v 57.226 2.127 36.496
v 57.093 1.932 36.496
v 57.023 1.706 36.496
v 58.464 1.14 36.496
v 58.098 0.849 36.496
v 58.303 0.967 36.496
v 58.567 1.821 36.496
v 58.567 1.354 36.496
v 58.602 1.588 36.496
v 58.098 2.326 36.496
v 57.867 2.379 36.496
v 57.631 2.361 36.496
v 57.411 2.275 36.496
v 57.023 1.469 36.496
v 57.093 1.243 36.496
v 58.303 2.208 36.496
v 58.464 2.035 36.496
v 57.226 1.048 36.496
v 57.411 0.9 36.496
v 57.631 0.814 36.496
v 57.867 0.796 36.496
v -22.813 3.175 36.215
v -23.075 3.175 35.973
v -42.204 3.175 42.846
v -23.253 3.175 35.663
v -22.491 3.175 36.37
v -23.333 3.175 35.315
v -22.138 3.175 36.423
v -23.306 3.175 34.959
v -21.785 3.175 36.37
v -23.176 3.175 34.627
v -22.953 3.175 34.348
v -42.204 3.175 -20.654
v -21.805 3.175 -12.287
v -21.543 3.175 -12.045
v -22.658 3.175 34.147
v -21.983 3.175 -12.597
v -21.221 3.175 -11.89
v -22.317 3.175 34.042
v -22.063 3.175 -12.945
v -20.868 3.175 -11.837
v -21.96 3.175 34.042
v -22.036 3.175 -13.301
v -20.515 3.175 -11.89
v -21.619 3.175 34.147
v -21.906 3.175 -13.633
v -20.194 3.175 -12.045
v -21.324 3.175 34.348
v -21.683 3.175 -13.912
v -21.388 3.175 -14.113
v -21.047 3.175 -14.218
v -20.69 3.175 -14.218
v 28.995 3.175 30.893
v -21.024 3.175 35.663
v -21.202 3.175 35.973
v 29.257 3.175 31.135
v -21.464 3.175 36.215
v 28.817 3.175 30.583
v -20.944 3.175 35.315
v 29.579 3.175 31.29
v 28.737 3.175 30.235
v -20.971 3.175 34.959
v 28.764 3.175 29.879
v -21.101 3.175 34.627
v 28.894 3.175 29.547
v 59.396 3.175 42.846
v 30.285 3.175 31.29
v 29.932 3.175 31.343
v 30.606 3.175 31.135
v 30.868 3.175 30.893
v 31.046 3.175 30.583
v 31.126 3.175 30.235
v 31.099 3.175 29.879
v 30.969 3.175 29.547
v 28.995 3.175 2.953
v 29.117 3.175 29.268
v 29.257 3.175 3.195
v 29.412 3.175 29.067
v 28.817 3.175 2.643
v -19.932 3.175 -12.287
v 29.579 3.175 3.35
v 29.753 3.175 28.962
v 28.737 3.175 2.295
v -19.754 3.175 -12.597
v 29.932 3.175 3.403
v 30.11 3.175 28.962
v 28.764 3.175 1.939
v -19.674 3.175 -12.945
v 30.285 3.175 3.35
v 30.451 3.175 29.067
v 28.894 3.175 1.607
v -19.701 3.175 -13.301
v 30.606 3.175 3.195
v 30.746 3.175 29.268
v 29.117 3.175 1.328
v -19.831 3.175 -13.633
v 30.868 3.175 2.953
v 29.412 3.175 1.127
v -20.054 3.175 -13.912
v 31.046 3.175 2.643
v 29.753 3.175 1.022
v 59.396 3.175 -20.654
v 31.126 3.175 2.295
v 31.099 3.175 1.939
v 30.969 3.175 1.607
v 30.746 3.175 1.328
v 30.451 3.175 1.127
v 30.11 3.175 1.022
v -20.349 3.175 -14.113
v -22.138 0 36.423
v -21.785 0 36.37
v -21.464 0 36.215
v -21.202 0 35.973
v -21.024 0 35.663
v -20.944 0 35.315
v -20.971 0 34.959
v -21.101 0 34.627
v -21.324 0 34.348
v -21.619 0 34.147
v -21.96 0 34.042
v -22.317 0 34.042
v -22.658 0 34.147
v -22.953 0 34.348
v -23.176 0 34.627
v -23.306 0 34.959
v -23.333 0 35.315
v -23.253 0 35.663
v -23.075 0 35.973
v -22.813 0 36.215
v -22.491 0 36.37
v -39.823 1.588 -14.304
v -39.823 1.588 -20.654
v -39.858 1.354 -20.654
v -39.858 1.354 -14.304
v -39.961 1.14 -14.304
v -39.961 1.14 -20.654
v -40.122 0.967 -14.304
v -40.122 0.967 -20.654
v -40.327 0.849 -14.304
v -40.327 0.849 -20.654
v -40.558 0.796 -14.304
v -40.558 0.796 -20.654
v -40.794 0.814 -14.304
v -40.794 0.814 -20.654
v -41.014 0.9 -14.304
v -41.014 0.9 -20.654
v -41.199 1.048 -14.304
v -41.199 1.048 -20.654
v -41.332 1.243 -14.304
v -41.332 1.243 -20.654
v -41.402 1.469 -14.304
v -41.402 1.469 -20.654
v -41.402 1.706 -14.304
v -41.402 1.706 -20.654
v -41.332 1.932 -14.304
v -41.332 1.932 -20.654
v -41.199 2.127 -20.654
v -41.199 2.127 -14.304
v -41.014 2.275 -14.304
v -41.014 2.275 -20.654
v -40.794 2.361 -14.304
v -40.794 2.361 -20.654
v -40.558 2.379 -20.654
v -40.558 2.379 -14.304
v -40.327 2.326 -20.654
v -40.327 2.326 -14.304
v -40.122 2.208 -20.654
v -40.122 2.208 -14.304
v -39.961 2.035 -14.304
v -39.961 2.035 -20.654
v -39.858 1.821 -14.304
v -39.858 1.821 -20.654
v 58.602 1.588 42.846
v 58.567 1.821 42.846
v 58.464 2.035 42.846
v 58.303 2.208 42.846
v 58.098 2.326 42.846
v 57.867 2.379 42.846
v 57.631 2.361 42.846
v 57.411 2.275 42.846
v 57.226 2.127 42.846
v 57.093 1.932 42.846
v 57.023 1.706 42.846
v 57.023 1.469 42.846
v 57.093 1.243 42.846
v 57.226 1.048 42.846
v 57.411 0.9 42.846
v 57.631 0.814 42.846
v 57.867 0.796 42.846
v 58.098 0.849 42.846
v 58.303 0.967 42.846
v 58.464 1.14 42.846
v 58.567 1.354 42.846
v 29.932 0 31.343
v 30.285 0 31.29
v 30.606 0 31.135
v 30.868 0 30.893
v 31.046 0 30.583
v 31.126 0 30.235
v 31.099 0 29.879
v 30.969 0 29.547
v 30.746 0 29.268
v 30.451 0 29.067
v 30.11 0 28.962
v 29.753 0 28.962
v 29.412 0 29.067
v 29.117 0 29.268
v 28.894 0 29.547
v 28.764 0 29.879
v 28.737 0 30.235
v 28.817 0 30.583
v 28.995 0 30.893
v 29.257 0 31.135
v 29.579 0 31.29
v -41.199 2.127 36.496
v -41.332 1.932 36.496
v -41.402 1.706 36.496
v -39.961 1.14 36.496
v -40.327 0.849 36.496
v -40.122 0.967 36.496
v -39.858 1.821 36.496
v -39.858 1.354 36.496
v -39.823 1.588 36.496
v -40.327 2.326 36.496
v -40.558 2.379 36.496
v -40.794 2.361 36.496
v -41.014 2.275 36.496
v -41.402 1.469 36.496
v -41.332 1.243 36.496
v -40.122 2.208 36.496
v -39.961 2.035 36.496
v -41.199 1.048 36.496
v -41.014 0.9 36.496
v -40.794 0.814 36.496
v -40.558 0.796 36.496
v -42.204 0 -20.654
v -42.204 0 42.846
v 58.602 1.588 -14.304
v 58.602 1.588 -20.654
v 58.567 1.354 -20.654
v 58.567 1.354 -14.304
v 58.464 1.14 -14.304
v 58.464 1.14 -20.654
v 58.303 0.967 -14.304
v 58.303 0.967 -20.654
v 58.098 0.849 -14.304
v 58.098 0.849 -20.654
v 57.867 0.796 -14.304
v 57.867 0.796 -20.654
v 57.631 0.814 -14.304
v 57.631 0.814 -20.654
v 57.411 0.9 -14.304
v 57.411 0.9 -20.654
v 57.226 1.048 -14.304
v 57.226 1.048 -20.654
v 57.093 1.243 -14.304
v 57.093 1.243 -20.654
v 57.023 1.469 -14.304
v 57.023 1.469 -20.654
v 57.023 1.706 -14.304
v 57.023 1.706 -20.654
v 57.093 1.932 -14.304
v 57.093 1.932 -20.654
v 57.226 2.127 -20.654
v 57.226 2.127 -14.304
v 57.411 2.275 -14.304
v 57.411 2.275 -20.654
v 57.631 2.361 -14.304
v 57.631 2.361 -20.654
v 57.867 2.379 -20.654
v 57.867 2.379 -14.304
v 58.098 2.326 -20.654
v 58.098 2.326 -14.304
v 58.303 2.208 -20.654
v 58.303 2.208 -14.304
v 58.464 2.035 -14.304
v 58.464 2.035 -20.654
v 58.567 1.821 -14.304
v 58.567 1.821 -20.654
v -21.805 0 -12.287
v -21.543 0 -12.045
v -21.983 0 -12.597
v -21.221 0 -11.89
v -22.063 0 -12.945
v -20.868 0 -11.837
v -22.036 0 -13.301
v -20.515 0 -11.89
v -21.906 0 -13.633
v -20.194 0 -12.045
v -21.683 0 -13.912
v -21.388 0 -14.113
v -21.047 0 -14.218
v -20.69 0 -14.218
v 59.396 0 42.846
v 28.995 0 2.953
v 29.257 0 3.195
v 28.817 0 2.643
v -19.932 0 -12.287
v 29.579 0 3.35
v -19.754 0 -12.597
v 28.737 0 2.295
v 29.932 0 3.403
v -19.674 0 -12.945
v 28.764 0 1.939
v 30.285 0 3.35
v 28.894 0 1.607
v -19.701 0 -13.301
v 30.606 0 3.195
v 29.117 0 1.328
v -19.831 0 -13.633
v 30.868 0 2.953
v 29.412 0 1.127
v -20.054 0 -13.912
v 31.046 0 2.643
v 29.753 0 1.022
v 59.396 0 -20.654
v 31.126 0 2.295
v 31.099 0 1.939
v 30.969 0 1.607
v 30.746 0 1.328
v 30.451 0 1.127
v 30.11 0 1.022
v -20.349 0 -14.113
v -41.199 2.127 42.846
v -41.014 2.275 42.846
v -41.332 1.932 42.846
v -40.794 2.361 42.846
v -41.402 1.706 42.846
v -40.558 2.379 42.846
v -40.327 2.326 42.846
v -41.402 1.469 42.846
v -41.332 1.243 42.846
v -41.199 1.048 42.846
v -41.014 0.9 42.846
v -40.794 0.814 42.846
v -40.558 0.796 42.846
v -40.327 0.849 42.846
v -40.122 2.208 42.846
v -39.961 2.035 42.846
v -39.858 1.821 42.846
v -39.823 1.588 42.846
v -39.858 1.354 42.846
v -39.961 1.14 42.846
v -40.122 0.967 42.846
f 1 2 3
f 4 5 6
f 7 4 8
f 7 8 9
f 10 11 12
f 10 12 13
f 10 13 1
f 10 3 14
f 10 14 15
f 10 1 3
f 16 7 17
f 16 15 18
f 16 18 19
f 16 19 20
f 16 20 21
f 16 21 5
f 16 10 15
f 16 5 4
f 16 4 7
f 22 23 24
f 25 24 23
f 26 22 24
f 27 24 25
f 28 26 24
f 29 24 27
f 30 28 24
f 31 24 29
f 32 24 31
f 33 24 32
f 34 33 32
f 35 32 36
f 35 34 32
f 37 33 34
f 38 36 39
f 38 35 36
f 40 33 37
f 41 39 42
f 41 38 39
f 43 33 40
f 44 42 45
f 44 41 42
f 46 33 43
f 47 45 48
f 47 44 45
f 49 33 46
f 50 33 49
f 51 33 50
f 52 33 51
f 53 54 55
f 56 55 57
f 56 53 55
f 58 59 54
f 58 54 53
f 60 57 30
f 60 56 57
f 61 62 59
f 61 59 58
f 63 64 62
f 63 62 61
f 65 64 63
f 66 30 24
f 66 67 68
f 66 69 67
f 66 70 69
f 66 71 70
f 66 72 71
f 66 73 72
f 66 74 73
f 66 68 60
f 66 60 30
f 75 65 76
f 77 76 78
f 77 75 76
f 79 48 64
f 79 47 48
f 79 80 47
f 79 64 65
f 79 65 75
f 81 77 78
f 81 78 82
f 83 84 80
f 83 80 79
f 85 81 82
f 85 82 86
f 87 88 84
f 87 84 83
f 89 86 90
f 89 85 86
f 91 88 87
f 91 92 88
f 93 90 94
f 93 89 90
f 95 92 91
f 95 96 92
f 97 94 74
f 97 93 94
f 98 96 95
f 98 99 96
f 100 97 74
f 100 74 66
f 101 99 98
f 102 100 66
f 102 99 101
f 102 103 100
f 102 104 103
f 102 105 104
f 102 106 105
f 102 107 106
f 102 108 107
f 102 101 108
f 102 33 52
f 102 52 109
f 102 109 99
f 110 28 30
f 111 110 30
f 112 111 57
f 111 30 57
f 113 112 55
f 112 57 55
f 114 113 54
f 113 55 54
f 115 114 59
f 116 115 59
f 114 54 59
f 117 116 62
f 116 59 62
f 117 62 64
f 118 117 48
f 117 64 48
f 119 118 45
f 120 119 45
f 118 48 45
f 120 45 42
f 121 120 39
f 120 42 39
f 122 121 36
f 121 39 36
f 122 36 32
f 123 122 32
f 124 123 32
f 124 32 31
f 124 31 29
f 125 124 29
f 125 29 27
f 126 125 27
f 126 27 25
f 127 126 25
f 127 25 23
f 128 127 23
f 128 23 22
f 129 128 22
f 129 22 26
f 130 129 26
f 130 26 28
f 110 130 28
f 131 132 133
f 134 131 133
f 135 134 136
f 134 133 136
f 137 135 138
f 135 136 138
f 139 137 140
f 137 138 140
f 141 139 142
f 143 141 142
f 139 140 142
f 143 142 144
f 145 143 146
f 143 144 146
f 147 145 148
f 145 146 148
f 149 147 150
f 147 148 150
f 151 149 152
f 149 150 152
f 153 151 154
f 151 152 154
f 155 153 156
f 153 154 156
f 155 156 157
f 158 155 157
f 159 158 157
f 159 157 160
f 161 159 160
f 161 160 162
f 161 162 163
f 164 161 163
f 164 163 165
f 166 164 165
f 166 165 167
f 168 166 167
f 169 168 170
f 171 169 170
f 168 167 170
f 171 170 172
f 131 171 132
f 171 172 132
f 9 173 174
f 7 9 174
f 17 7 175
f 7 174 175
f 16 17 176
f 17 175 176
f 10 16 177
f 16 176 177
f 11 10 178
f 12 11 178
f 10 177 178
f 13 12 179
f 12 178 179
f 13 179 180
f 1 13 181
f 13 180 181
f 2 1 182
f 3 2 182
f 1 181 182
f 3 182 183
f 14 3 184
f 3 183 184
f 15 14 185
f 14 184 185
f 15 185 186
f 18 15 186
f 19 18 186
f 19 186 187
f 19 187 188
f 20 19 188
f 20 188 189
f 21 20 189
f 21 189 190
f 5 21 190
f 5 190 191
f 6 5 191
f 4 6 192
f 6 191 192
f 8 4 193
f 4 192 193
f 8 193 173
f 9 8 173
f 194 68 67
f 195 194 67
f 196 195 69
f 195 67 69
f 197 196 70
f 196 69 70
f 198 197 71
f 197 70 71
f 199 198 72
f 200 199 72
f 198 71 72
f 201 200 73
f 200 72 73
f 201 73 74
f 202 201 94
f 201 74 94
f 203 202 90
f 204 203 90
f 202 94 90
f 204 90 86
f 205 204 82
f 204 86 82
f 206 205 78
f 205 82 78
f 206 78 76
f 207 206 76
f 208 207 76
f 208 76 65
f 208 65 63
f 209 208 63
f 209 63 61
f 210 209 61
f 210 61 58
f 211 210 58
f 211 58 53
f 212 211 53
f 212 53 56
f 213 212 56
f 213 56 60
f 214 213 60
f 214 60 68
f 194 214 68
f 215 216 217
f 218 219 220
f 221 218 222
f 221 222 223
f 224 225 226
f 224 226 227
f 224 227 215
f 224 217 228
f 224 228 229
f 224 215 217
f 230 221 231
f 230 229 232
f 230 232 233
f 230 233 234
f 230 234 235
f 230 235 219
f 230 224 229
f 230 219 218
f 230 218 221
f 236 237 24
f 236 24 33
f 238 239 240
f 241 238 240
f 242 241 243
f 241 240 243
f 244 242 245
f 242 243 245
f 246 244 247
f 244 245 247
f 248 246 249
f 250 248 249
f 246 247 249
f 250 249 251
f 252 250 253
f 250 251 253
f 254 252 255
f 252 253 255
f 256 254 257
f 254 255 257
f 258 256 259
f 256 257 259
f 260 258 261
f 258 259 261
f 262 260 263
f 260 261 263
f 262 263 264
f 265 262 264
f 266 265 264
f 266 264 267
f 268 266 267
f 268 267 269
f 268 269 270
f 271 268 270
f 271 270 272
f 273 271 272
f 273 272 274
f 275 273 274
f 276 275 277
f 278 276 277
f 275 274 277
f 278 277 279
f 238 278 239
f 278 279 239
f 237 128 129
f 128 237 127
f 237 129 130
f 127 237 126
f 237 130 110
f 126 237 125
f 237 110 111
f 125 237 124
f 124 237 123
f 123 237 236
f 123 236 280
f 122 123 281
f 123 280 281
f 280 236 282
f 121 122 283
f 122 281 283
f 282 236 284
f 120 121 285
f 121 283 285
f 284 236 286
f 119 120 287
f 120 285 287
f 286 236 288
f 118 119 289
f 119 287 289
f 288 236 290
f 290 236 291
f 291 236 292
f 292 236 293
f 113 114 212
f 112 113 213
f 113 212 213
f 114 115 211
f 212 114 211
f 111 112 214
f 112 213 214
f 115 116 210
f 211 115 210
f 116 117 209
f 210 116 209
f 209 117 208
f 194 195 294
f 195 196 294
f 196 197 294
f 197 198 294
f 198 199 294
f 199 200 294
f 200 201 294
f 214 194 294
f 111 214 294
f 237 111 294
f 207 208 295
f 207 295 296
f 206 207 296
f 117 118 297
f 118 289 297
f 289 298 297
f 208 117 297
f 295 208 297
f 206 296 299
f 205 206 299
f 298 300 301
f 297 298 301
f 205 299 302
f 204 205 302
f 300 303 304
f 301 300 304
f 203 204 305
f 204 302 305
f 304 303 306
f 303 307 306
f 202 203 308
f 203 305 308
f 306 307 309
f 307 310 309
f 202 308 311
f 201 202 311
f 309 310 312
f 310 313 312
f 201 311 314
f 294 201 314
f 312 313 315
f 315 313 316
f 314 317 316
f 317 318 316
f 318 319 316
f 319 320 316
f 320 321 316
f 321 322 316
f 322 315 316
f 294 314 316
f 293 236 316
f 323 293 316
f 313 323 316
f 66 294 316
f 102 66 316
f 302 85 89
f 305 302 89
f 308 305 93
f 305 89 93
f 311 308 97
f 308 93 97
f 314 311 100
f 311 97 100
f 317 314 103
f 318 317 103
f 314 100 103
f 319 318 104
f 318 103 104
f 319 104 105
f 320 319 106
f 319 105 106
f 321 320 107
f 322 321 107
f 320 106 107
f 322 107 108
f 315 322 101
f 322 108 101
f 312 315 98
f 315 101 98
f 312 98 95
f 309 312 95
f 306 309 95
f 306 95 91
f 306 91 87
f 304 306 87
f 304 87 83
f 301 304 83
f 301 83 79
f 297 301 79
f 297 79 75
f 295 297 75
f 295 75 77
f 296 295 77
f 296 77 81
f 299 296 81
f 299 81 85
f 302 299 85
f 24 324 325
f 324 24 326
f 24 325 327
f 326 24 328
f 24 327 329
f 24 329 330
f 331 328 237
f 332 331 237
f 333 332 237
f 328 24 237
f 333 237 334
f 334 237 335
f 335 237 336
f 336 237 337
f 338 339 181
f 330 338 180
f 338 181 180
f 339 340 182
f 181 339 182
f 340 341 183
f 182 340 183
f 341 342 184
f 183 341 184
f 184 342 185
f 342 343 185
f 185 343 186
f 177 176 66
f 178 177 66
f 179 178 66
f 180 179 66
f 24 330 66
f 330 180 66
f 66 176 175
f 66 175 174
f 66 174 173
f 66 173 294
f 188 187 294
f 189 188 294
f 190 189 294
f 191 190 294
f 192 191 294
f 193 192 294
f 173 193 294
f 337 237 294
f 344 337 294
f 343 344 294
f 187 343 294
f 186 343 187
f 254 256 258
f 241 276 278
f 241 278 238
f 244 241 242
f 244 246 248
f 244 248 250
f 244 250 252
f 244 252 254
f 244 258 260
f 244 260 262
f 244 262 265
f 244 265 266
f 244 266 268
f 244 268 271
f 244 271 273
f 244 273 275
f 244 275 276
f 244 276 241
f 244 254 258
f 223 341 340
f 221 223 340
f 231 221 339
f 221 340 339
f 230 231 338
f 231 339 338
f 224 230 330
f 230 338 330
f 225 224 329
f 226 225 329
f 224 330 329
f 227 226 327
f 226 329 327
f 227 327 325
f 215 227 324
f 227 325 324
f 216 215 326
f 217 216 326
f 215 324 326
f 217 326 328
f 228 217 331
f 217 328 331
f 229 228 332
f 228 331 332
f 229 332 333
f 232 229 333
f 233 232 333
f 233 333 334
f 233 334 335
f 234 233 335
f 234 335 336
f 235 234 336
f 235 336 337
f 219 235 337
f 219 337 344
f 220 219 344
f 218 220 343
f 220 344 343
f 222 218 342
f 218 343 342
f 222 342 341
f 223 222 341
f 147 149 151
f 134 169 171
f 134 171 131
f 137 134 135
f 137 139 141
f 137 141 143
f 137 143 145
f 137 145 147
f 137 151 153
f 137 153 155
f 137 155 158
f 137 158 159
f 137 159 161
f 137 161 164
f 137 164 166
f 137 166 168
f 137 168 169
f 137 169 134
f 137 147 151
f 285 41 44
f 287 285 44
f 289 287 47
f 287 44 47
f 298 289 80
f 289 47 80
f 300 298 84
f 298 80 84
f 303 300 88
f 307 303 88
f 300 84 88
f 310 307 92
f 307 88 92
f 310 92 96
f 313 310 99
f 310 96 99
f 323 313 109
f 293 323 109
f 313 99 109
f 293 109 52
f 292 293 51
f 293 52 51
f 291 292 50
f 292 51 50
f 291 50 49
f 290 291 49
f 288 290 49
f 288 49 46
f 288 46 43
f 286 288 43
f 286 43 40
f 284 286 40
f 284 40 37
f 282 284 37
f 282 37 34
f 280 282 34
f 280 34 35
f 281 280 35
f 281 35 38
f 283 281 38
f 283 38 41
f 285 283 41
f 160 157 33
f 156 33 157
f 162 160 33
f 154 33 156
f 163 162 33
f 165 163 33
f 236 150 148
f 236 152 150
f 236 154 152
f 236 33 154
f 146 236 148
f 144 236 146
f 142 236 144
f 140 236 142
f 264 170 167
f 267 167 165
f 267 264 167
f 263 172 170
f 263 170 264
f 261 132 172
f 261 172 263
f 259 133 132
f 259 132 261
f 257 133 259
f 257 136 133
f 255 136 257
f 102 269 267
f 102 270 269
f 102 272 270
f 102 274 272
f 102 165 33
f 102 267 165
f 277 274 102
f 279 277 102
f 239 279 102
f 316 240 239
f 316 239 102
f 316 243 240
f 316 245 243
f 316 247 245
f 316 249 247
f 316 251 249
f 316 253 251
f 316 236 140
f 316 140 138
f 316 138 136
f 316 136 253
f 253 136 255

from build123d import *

# Parameters (mm, degrees)
SKETCH1_W           = 101.6
SKETCH1_H           = 63.5
BOSS_EXTRUDE1_DEPTH = 3.175
SKETCH2_R           = 0.79375
CUT_EXTRUDE1_DEPTH  = 6.35
SKETCH3_R           = 0.79375
CUT_EXTRUDE2_DEPTH  = 6.35
SKETCH4_R           = 1.19761
CUT_EXTRUDE3_DEPTH  = 4.175


with BuildPart() as part:
    # Sketch1 → Boss-Extrude1 (new body)
    with BuildSketch(Plane(origin=(0, 0, 0), x_dir=(1, 0, 0), z_dir=(0, 1, 0))):
        with Locations((8.595554542, -11.095875723)):
            Rectangle(SKETCH1_W, SKETCH1_H)
    extrude(amount=BOSS_EXTRUDE1_DEPTH)

    # Sketch2 → Cut-Extrude1 (cut)
    with BuildSketch(Plane.XY.offset(42.845875723)):
        with Locations((-40.616945458, 1.5875)):
            Circle(SKETCH2_R)
        with Locations((57.808054542, 1.5875)):
            Circle(SKETCH2_R)
    extrude(amount=-CUT_EXTRUDE1_DEPTH, mode=Mode.SUBTRACT)

    # Sketch3 → Cut-Extrude2 (cut)
    with BuildSketch(Plane(origin=(0, 0, -20.654124277), x_dir=(-1, 0, 0), z_dir=(0, 0, -1))):
        with Locations(Location((-57.808054542, 1.5875, 0), (0, 0, 180))):  # turned: the seam where the file's is
            Circle(SKETCH3_R)
        with Locations(Location((40.616945458, 1.5875, 0), (0, 0, 180))):  # turned: the seam where the file's is
            Circle(SKETCH3_R)
    extrude(amount=-CUT_EXTRUDE2_DEPTH, mode=Mode.SUBTRACT)

    # Sketch4 → Cut-Extrude3 (cut, through all)
    with BuildSketch(Plane(origin=(0, 3.175, 0), x_dir=(1, 0, 0), z_dir=(0, 1, 0))):
        with Locations(Location((-20.868445458, 13.034124277, 0), (0, 0, 270))):  # turned: the seam where the file's is
            Circle(SKETCH4_R)
        with Locations(Location((-22.138445458, -35.225875723, 0), (0, 0, 270))):  # turned: the seam where the file's is
            Circle(SKETCH4_R)
        with Locations(Location((29.931554542, -2.205875723, 0), (0, 0, 270))):  # turned: the seam where the file's is
            Circle(SKETCH4_R)
        with Locations(Location((29.931554542, -30.145875723, 0), (0, 0, 270))):  # turned: the seam where the file's is
            Circle(SKETCH4_R)
    extrude(amount=-CUT_EXTRUDE3_DEPTH, mode=Mode.SUBTRACT)


solid = part.part
